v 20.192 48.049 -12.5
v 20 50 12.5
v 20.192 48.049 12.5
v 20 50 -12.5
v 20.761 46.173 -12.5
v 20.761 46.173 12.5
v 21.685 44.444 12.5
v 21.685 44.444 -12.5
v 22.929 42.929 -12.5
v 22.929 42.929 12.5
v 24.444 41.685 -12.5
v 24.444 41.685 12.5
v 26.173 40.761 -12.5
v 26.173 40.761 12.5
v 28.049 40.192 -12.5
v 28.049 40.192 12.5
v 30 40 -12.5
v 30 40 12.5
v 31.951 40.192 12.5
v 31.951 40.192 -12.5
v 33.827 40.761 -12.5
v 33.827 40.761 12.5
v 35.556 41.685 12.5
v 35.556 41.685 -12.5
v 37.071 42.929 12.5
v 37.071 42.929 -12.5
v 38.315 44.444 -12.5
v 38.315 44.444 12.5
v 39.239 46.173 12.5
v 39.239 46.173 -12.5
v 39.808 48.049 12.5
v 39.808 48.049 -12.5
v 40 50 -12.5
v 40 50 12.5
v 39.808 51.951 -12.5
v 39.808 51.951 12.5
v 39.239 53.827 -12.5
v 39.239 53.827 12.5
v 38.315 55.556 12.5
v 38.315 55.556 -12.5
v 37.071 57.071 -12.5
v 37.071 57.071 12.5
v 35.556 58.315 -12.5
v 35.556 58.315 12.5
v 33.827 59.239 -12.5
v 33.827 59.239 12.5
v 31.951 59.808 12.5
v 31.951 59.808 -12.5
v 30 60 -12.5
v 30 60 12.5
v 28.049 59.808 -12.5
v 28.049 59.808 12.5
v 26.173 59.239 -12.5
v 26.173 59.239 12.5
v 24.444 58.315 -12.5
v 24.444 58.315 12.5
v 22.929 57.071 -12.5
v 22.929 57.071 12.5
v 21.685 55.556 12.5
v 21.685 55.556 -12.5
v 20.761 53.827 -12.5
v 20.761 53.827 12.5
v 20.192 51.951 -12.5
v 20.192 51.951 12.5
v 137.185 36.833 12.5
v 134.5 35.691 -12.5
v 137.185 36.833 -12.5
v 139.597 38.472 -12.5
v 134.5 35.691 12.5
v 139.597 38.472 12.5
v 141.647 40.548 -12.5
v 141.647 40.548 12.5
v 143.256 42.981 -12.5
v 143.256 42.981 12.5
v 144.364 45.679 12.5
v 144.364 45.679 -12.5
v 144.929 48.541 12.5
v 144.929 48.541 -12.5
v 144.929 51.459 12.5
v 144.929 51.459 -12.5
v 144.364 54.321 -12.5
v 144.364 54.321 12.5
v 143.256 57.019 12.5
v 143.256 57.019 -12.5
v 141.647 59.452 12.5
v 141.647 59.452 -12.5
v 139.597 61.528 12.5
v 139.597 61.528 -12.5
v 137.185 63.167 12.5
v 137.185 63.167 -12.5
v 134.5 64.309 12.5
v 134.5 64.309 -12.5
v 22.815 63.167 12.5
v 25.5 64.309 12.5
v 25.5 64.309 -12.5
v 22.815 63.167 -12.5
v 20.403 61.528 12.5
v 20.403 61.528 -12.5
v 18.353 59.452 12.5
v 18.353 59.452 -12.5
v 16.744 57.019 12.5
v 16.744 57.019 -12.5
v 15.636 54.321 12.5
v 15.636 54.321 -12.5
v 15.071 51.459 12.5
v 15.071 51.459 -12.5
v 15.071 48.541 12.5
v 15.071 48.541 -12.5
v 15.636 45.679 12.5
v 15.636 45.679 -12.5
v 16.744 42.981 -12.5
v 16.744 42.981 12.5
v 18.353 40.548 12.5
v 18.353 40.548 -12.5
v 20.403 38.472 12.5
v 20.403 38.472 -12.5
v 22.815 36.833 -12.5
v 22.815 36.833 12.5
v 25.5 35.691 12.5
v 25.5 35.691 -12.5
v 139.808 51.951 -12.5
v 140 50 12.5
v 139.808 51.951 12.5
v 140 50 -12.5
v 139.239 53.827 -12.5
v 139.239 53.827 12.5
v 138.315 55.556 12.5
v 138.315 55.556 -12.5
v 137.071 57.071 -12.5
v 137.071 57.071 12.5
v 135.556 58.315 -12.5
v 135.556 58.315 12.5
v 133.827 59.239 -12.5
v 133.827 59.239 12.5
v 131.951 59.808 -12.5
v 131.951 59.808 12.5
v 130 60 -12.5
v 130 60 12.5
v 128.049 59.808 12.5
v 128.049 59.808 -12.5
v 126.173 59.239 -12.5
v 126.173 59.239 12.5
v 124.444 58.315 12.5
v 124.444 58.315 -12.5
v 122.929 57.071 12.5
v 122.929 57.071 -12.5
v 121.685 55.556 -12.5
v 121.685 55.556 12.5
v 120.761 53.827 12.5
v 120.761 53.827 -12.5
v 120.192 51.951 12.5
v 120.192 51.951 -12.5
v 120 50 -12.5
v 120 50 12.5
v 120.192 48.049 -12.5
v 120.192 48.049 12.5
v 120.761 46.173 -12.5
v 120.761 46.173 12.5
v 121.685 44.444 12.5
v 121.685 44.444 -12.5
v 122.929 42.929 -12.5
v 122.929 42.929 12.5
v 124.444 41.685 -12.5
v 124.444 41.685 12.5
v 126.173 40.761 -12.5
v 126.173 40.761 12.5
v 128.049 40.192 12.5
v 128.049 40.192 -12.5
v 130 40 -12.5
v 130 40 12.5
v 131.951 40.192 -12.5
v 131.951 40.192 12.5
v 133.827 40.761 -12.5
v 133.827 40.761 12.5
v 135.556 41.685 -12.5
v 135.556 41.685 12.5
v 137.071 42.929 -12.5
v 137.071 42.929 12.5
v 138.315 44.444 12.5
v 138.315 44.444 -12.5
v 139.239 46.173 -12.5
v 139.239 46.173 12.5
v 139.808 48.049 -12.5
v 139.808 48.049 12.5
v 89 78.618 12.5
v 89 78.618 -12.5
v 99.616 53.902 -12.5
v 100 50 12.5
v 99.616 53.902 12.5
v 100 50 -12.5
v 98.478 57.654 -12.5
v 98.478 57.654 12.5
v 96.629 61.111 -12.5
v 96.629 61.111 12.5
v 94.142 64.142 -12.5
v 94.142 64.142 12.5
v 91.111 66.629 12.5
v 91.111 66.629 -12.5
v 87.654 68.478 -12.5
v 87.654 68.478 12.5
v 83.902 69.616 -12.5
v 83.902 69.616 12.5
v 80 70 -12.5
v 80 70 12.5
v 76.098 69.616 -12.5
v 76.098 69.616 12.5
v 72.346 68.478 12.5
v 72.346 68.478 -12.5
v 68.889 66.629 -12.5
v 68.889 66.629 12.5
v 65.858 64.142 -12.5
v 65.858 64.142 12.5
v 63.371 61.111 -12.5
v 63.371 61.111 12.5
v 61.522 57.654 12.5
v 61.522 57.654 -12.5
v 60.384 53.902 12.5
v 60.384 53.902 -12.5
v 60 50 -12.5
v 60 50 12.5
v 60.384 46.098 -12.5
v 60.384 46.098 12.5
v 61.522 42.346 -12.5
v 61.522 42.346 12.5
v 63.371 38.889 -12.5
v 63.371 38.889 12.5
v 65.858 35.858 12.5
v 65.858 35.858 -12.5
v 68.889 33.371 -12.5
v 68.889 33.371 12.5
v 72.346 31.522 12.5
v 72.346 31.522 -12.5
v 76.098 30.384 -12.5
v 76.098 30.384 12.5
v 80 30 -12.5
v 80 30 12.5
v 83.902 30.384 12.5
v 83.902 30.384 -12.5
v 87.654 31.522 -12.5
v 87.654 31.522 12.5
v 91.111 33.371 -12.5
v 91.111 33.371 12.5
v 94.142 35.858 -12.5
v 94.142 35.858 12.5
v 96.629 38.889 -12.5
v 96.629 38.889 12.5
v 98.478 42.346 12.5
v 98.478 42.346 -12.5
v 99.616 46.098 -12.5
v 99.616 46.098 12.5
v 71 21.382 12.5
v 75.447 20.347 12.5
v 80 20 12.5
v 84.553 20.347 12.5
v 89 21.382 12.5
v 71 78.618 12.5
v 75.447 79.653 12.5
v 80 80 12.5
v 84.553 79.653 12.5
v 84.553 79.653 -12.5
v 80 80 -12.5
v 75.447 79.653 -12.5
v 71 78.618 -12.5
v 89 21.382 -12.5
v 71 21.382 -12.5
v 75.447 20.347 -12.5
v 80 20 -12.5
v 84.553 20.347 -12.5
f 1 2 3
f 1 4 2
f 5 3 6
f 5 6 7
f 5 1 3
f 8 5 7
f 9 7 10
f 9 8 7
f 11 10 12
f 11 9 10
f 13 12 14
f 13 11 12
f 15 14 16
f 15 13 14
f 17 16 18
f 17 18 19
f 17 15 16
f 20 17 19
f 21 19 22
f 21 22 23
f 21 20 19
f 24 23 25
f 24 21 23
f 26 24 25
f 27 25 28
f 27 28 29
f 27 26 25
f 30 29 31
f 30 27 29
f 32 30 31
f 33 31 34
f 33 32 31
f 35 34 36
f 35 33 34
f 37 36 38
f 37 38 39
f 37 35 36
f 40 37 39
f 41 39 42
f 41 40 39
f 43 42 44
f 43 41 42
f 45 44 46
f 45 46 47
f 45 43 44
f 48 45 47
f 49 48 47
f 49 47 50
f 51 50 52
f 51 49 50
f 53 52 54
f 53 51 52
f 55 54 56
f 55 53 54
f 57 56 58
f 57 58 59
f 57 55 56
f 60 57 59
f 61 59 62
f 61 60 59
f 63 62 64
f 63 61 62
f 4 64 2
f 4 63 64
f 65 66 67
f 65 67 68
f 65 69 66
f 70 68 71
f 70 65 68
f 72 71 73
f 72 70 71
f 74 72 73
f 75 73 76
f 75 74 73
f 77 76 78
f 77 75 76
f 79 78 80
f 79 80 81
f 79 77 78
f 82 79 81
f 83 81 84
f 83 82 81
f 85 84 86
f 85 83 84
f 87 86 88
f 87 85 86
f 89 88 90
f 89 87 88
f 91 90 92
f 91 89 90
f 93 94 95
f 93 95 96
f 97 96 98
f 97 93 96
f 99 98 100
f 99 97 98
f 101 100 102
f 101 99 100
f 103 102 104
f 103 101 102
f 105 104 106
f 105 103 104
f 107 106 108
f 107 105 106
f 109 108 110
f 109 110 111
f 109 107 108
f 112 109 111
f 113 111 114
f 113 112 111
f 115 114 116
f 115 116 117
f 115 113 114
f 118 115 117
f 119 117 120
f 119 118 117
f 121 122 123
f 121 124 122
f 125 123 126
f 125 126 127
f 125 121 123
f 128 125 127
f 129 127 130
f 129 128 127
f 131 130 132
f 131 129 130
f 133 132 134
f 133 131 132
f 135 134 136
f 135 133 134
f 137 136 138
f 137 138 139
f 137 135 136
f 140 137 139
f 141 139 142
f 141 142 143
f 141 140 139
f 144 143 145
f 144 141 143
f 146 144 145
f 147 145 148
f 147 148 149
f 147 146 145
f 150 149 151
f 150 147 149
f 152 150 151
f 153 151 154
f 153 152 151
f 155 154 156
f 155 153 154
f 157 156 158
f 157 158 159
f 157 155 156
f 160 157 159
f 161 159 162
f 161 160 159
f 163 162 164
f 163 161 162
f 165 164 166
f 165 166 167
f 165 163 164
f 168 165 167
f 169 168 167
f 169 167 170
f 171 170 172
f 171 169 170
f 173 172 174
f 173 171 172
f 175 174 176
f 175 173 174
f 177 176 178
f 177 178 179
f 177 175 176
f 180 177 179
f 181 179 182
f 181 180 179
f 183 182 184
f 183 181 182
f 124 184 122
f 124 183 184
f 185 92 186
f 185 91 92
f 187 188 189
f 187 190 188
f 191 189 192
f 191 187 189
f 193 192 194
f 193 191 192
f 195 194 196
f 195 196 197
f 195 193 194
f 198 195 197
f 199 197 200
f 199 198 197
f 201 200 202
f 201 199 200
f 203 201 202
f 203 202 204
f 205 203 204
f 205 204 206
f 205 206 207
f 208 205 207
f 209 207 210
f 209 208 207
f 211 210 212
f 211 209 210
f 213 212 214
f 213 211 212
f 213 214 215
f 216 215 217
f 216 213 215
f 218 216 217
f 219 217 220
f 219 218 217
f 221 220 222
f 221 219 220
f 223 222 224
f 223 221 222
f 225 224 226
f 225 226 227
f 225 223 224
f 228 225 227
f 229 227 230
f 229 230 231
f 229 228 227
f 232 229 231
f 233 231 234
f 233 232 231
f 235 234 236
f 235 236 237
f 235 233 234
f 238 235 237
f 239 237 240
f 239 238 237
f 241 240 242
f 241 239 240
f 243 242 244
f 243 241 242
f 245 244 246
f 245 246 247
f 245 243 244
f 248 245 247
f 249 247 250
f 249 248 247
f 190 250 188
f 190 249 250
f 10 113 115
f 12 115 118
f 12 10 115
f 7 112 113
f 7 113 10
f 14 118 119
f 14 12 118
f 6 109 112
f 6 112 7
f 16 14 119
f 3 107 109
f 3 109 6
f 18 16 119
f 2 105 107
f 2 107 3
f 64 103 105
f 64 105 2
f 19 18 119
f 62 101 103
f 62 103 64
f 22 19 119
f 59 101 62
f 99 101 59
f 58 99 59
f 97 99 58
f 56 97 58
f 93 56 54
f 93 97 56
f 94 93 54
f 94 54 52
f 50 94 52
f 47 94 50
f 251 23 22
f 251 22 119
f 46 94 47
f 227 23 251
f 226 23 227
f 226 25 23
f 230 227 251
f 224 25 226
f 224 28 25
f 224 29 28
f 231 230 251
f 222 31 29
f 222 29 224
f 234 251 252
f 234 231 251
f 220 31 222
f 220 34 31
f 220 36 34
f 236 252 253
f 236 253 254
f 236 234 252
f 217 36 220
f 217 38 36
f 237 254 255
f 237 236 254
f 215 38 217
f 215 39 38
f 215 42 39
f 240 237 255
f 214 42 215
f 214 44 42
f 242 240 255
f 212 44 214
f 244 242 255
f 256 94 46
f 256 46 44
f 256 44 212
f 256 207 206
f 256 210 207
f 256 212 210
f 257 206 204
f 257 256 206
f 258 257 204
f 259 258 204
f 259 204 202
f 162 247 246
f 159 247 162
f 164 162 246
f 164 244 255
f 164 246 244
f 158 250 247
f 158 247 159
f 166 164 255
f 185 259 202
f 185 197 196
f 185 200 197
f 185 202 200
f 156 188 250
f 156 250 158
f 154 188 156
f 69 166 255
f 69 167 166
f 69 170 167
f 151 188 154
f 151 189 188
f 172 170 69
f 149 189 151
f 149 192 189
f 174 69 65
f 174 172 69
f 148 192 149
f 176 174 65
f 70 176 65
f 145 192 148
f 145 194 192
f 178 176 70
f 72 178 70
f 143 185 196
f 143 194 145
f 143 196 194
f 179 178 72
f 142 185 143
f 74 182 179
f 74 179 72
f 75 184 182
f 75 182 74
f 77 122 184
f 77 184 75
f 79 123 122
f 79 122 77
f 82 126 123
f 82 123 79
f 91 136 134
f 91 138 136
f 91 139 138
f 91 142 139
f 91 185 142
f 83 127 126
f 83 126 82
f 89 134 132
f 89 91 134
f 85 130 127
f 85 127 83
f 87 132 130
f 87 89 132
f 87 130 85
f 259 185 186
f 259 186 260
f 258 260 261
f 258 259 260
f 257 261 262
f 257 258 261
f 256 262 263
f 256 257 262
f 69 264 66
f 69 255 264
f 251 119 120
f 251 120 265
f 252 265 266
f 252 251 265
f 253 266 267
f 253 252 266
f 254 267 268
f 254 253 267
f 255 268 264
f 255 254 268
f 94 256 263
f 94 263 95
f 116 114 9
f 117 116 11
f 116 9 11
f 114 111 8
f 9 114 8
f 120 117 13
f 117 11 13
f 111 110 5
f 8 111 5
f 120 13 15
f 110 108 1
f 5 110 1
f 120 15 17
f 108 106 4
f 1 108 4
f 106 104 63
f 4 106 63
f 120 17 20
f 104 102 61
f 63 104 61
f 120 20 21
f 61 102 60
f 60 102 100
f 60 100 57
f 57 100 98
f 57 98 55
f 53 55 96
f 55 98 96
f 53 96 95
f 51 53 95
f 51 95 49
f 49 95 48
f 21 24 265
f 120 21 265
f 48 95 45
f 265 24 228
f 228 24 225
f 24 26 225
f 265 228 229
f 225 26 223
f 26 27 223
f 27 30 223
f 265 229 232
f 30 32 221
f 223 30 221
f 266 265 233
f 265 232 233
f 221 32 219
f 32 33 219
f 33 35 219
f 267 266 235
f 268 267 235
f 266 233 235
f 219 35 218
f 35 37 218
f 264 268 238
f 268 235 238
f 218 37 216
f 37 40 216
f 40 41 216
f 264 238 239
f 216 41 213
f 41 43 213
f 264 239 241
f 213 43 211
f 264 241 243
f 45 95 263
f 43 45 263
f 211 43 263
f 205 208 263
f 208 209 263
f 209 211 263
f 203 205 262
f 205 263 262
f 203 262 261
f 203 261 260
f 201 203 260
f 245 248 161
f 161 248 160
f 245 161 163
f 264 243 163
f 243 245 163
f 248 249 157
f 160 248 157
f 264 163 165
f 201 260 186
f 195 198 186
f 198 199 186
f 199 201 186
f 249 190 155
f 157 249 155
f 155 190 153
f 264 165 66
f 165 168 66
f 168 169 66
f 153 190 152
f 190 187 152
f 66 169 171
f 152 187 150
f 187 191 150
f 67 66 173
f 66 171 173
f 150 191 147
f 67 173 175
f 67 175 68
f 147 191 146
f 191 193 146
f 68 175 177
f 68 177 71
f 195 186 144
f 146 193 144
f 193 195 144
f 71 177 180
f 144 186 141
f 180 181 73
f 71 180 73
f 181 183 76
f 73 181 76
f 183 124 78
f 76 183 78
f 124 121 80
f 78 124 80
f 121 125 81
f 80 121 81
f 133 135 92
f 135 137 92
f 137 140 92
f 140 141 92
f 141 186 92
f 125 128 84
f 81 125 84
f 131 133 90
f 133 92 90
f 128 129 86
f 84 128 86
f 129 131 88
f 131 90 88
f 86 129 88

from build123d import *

# Parameters (mm, degrees)
SKETCH1_R           = 20
SKETCH1_R_2         = 10
BOSS_EXTRUDE1_DEPTH = 12.5


with BuildPart() as part:
    # Sketch1 → Boss-Extrude1 (new, symmetric)
    with BuildSketch(Plane.XY):
        with BuildLine():
            Line((134.5, 64.309088021), (89, 78.618176043))
            ThreePointArc((89, 78.618176043), (80, 80), (71, 78.618176043))
            Line((71, 78.618176043), (25.5, 64.309088021))
            ThreePointArc((25.5, 64.309088021), (15, 50), (25.5, 35.690911979))
            Line((25.5, 35.690911979), (71, 21.381823957))
            ThreePointArc((71, 21.381823957), (80, 20), (89, 21.381823957))
            Line((89, 21.381823957), (134.5, 35.690911979))
            ThreePointArc((134.5, 35.690911979), (145, 50), (134.5, 64.309088021))
        make_face()
        with Locations((80, 50)):
            Circle(SKETCH1_R, mode=Mode.SUBTRACT)
        with Locations((130, 50)):
            Circle(SKETCH1_R_2, mode=Mode.SUBTRACT)
        with Locations(Location((30, 50, 0), (0, 0, 180))):
            Circle(SKETCH1_R_2, mode=Mode.SUBTRACT)
    extrude(amount=BOSS_EXTRUDE1_DEPTH, both=True)


solid = part.part
